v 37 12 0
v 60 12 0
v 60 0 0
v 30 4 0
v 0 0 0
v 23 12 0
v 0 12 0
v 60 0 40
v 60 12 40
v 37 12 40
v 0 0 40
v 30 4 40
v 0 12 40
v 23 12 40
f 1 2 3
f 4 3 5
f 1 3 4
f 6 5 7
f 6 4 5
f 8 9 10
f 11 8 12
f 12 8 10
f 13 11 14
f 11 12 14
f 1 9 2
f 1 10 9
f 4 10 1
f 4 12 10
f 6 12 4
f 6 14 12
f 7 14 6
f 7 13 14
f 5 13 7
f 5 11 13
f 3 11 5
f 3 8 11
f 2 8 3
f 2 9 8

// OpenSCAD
$fn = 32;

// ----------------------------------------------------------------------
// V guide rail: vway, 60 mm wide
// ----------------------------------------------------------------------

// --- parameters (mm) ---
rail_w = 60;              // rail width, X
base_t = 12;              // base plate thickness
v_depth = 8;              // V feature depth / height
v_half_w = 7;             // half width of the V at the base face
plate_t = 40;             // rail length, Z (the extrusion height)
fit_tol = 0.1;            // declared fit tolerance (prompt contract)
free_tol = 0.5;           // declared free tolerance (prompt contract)

profile = [[0, 0], [60, 0], [60, 12], [37, 12], [30, 4], [23, 12], [0, 12]];  // primary outline, 7 points, counter clockwise

// --- the one profile operation ---
linear_extrude(height = plate_t) polygon(points = profile);
